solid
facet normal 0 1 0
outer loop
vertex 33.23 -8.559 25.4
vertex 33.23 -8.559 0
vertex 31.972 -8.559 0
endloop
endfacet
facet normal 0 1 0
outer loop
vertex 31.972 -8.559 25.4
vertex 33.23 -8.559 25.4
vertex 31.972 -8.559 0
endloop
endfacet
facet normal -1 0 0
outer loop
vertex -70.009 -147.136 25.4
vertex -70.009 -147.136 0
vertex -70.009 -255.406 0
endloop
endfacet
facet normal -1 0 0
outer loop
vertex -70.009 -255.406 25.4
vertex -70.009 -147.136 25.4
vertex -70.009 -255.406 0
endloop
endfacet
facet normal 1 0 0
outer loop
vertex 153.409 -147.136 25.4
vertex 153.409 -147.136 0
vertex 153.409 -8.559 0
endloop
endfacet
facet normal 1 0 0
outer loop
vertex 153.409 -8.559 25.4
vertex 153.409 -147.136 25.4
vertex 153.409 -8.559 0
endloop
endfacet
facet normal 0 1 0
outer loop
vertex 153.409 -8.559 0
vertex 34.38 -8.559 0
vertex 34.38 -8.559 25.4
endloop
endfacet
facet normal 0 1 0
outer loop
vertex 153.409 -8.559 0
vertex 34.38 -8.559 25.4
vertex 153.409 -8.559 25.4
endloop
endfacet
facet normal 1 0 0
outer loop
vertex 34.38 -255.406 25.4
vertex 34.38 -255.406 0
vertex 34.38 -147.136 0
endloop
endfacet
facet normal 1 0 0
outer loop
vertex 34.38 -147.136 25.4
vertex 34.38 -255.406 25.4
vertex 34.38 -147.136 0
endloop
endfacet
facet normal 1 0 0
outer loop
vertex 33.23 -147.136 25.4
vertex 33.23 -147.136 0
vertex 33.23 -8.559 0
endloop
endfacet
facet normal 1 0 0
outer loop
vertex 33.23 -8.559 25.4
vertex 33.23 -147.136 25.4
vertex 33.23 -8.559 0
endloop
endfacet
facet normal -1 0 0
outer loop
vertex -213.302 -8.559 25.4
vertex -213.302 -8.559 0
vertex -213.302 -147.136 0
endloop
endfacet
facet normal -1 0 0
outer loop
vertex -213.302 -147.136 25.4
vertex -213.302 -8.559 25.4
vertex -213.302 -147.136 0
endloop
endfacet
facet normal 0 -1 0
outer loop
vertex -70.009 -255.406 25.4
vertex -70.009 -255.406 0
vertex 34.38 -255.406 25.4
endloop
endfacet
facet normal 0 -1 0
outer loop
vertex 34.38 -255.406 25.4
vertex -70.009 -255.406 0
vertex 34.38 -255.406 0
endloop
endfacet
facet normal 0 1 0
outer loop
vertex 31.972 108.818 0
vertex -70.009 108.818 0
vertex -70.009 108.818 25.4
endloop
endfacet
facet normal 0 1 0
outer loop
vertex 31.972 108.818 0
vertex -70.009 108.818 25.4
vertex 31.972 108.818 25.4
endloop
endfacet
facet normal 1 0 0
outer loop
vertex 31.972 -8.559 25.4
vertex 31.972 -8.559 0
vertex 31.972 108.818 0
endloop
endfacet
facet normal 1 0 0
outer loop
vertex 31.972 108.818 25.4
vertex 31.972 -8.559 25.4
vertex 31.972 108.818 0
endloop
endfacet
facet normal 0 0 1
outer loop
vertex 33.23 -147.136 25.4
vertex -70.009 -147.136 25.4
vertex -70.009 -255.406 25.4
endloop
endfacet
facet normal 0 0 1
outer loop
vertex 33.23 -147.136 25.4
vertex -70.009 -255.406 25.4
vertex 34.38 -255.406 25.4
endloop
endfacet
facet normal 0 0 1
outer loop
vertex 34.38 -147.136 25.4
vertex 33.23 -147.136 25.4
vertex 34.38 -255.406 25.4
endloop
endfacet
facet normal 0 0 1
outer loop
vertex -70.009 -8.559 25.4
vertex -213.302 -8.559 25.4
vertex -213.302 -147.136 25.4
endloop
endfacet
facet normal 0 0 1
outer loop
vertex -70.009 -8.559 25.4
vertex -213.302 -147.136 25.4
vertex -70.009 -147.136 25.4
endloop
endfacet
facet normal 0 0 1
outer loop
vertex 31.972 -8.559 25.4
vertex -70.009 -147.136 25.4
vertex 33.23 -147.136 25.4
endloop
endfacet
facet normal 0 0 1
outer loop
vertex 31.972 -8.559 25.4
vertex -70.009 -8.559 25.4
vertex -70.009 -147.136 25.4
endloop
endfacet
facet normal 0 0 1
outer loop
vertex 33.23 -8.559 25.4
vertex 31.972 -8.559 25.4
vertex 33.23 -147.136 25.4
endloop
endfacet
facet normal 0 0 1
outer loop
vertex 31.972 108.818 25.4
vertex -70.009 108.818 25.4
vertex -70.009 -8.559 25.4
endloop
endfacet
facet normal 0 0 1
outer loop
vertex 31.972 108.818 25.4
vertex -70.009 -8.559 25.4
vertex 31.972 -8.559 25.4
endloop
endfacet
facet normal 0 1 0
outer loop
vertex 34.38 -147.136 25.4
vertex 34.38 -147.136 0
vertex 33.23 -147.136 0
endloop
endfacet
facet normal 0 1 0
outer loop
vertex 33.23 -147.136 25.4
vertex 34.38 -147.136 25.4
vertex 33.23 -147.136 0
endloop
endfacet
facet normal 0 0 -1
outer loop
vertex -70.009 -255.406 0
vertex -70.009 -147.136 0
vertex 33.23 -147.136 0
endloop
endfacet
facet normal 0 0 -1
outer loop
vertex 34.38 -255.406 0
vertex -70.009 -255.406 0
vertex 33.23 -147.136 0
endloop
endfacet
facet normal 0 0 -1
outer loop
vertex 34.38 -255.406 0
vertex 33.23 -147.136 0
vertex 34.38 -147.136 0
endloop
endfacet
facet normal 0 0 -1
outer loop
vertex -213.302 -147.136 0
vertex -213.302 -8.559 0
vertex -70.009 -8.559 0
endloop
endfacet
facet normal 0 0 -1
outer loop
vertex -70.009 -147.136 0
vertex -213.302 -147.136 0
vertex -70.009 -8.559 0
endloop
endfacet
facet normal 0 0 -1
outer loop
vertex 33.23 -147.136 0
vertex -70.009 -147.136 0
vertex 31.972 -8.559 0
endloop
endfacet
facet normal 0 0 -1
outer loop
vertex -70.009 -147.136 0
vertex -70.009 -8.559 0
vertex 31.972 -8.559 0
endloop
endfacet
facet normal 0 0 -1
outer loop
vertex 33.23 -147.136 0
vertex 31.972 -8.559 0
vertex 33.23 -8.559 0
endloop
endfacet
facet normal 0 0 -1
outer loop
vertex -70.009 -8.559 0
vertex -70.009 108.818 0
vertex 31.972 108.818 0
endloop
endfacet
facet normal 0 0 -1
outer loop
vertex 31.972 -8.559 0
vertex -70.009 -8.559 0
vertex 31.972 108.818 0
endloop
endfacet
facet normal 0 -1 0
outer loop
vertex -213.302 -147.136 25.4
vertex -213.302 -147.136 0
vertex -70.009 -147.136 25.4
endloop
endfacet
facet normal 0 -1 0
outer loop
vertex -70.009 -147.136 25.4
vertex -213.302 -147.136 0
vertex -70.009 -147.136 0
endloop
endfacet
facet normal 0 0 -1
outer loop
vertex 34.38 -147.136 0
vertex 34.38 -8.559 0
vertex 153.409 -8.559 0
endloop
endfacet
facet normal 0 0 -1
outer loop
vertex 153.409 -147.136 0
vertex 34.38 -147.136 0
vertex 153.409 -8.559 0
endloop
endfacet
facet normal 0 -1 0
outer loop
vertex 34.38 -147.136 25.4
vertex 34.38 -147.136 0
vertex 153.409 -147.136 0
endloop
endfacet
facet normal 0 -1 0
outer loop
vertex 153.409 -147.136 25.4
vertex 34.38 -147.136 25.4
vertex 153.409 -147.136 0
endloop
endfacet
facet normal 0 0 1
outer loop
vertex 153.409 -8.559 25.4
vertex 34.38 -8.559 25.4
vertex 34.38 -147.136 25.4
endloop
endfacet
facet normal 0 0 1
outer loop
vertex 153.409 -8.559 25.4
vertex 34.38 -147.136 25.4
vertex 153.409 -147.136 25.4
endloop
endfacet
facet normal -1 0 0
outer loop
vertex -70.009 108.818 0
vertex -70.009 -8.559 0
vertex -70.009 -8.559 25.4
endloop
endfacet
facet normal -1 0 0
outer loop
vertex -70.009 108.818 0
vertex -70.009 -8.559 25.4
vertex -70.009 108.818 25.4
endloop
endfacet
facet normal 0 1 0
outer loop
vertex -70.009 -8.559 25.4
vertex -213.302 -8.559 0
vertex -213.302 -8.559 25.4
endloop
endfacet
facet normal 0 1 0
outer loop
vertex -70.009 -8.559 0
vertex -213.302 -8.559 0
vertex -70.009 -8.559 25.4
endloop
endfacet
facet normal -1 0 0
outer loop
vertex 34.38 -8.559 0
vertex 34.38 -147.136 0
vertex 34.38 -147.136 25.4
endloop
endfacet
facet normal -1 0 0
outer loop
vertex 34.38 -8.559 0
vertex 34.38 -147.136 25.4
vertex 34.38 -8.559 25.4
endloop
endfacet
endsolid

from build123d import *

# Parameters (mm, degrees)
F0_W     = 143.29303
F0_H     = 50.347287
F0_W_2   = 119.029246
F0_H_2   = 138.577204
F0_H_3   = 88.229917
F0_W_3   = 101.981629
F0_H_4   = 117.377427
F1_DEPTH = 25.4


with BuildPart() as f1:
    # F0 (on Top) → F1 (new body)
    with BuildSketch(Plane.XY):
        with Locations((-141.655799, -33.732844)):
            Rectangle(F0_W, F0_H)
        with Locations((93.894217, -77.847803)):
            Rectangle(F0_W_2, F0_H_2)
        with Locations((-141.655799, -103.021446)):
            Rectangle(F0_W, F0_H_3)
        Polygon((-70.009284, -8.559201), (-70.009284, -58.906488), (-70.009284, -147.136405), (33.230212, -147.136405), (33.230212, -8.559201), (31.972345, -8.559201), align=None)
        with Locations((-19.018469, 50.129512)):
            Rectangle(F0_W_3, F0_H_4)
        Polygon((33.230212, -147.136405), (-70.009284, -147.136405), (-70.009284, -255.40629), (34.379594, -255.40629), (34.379594, -147.136405), align=None)
    extrude(amount=F1_DEPTH)


solid = f1.part
